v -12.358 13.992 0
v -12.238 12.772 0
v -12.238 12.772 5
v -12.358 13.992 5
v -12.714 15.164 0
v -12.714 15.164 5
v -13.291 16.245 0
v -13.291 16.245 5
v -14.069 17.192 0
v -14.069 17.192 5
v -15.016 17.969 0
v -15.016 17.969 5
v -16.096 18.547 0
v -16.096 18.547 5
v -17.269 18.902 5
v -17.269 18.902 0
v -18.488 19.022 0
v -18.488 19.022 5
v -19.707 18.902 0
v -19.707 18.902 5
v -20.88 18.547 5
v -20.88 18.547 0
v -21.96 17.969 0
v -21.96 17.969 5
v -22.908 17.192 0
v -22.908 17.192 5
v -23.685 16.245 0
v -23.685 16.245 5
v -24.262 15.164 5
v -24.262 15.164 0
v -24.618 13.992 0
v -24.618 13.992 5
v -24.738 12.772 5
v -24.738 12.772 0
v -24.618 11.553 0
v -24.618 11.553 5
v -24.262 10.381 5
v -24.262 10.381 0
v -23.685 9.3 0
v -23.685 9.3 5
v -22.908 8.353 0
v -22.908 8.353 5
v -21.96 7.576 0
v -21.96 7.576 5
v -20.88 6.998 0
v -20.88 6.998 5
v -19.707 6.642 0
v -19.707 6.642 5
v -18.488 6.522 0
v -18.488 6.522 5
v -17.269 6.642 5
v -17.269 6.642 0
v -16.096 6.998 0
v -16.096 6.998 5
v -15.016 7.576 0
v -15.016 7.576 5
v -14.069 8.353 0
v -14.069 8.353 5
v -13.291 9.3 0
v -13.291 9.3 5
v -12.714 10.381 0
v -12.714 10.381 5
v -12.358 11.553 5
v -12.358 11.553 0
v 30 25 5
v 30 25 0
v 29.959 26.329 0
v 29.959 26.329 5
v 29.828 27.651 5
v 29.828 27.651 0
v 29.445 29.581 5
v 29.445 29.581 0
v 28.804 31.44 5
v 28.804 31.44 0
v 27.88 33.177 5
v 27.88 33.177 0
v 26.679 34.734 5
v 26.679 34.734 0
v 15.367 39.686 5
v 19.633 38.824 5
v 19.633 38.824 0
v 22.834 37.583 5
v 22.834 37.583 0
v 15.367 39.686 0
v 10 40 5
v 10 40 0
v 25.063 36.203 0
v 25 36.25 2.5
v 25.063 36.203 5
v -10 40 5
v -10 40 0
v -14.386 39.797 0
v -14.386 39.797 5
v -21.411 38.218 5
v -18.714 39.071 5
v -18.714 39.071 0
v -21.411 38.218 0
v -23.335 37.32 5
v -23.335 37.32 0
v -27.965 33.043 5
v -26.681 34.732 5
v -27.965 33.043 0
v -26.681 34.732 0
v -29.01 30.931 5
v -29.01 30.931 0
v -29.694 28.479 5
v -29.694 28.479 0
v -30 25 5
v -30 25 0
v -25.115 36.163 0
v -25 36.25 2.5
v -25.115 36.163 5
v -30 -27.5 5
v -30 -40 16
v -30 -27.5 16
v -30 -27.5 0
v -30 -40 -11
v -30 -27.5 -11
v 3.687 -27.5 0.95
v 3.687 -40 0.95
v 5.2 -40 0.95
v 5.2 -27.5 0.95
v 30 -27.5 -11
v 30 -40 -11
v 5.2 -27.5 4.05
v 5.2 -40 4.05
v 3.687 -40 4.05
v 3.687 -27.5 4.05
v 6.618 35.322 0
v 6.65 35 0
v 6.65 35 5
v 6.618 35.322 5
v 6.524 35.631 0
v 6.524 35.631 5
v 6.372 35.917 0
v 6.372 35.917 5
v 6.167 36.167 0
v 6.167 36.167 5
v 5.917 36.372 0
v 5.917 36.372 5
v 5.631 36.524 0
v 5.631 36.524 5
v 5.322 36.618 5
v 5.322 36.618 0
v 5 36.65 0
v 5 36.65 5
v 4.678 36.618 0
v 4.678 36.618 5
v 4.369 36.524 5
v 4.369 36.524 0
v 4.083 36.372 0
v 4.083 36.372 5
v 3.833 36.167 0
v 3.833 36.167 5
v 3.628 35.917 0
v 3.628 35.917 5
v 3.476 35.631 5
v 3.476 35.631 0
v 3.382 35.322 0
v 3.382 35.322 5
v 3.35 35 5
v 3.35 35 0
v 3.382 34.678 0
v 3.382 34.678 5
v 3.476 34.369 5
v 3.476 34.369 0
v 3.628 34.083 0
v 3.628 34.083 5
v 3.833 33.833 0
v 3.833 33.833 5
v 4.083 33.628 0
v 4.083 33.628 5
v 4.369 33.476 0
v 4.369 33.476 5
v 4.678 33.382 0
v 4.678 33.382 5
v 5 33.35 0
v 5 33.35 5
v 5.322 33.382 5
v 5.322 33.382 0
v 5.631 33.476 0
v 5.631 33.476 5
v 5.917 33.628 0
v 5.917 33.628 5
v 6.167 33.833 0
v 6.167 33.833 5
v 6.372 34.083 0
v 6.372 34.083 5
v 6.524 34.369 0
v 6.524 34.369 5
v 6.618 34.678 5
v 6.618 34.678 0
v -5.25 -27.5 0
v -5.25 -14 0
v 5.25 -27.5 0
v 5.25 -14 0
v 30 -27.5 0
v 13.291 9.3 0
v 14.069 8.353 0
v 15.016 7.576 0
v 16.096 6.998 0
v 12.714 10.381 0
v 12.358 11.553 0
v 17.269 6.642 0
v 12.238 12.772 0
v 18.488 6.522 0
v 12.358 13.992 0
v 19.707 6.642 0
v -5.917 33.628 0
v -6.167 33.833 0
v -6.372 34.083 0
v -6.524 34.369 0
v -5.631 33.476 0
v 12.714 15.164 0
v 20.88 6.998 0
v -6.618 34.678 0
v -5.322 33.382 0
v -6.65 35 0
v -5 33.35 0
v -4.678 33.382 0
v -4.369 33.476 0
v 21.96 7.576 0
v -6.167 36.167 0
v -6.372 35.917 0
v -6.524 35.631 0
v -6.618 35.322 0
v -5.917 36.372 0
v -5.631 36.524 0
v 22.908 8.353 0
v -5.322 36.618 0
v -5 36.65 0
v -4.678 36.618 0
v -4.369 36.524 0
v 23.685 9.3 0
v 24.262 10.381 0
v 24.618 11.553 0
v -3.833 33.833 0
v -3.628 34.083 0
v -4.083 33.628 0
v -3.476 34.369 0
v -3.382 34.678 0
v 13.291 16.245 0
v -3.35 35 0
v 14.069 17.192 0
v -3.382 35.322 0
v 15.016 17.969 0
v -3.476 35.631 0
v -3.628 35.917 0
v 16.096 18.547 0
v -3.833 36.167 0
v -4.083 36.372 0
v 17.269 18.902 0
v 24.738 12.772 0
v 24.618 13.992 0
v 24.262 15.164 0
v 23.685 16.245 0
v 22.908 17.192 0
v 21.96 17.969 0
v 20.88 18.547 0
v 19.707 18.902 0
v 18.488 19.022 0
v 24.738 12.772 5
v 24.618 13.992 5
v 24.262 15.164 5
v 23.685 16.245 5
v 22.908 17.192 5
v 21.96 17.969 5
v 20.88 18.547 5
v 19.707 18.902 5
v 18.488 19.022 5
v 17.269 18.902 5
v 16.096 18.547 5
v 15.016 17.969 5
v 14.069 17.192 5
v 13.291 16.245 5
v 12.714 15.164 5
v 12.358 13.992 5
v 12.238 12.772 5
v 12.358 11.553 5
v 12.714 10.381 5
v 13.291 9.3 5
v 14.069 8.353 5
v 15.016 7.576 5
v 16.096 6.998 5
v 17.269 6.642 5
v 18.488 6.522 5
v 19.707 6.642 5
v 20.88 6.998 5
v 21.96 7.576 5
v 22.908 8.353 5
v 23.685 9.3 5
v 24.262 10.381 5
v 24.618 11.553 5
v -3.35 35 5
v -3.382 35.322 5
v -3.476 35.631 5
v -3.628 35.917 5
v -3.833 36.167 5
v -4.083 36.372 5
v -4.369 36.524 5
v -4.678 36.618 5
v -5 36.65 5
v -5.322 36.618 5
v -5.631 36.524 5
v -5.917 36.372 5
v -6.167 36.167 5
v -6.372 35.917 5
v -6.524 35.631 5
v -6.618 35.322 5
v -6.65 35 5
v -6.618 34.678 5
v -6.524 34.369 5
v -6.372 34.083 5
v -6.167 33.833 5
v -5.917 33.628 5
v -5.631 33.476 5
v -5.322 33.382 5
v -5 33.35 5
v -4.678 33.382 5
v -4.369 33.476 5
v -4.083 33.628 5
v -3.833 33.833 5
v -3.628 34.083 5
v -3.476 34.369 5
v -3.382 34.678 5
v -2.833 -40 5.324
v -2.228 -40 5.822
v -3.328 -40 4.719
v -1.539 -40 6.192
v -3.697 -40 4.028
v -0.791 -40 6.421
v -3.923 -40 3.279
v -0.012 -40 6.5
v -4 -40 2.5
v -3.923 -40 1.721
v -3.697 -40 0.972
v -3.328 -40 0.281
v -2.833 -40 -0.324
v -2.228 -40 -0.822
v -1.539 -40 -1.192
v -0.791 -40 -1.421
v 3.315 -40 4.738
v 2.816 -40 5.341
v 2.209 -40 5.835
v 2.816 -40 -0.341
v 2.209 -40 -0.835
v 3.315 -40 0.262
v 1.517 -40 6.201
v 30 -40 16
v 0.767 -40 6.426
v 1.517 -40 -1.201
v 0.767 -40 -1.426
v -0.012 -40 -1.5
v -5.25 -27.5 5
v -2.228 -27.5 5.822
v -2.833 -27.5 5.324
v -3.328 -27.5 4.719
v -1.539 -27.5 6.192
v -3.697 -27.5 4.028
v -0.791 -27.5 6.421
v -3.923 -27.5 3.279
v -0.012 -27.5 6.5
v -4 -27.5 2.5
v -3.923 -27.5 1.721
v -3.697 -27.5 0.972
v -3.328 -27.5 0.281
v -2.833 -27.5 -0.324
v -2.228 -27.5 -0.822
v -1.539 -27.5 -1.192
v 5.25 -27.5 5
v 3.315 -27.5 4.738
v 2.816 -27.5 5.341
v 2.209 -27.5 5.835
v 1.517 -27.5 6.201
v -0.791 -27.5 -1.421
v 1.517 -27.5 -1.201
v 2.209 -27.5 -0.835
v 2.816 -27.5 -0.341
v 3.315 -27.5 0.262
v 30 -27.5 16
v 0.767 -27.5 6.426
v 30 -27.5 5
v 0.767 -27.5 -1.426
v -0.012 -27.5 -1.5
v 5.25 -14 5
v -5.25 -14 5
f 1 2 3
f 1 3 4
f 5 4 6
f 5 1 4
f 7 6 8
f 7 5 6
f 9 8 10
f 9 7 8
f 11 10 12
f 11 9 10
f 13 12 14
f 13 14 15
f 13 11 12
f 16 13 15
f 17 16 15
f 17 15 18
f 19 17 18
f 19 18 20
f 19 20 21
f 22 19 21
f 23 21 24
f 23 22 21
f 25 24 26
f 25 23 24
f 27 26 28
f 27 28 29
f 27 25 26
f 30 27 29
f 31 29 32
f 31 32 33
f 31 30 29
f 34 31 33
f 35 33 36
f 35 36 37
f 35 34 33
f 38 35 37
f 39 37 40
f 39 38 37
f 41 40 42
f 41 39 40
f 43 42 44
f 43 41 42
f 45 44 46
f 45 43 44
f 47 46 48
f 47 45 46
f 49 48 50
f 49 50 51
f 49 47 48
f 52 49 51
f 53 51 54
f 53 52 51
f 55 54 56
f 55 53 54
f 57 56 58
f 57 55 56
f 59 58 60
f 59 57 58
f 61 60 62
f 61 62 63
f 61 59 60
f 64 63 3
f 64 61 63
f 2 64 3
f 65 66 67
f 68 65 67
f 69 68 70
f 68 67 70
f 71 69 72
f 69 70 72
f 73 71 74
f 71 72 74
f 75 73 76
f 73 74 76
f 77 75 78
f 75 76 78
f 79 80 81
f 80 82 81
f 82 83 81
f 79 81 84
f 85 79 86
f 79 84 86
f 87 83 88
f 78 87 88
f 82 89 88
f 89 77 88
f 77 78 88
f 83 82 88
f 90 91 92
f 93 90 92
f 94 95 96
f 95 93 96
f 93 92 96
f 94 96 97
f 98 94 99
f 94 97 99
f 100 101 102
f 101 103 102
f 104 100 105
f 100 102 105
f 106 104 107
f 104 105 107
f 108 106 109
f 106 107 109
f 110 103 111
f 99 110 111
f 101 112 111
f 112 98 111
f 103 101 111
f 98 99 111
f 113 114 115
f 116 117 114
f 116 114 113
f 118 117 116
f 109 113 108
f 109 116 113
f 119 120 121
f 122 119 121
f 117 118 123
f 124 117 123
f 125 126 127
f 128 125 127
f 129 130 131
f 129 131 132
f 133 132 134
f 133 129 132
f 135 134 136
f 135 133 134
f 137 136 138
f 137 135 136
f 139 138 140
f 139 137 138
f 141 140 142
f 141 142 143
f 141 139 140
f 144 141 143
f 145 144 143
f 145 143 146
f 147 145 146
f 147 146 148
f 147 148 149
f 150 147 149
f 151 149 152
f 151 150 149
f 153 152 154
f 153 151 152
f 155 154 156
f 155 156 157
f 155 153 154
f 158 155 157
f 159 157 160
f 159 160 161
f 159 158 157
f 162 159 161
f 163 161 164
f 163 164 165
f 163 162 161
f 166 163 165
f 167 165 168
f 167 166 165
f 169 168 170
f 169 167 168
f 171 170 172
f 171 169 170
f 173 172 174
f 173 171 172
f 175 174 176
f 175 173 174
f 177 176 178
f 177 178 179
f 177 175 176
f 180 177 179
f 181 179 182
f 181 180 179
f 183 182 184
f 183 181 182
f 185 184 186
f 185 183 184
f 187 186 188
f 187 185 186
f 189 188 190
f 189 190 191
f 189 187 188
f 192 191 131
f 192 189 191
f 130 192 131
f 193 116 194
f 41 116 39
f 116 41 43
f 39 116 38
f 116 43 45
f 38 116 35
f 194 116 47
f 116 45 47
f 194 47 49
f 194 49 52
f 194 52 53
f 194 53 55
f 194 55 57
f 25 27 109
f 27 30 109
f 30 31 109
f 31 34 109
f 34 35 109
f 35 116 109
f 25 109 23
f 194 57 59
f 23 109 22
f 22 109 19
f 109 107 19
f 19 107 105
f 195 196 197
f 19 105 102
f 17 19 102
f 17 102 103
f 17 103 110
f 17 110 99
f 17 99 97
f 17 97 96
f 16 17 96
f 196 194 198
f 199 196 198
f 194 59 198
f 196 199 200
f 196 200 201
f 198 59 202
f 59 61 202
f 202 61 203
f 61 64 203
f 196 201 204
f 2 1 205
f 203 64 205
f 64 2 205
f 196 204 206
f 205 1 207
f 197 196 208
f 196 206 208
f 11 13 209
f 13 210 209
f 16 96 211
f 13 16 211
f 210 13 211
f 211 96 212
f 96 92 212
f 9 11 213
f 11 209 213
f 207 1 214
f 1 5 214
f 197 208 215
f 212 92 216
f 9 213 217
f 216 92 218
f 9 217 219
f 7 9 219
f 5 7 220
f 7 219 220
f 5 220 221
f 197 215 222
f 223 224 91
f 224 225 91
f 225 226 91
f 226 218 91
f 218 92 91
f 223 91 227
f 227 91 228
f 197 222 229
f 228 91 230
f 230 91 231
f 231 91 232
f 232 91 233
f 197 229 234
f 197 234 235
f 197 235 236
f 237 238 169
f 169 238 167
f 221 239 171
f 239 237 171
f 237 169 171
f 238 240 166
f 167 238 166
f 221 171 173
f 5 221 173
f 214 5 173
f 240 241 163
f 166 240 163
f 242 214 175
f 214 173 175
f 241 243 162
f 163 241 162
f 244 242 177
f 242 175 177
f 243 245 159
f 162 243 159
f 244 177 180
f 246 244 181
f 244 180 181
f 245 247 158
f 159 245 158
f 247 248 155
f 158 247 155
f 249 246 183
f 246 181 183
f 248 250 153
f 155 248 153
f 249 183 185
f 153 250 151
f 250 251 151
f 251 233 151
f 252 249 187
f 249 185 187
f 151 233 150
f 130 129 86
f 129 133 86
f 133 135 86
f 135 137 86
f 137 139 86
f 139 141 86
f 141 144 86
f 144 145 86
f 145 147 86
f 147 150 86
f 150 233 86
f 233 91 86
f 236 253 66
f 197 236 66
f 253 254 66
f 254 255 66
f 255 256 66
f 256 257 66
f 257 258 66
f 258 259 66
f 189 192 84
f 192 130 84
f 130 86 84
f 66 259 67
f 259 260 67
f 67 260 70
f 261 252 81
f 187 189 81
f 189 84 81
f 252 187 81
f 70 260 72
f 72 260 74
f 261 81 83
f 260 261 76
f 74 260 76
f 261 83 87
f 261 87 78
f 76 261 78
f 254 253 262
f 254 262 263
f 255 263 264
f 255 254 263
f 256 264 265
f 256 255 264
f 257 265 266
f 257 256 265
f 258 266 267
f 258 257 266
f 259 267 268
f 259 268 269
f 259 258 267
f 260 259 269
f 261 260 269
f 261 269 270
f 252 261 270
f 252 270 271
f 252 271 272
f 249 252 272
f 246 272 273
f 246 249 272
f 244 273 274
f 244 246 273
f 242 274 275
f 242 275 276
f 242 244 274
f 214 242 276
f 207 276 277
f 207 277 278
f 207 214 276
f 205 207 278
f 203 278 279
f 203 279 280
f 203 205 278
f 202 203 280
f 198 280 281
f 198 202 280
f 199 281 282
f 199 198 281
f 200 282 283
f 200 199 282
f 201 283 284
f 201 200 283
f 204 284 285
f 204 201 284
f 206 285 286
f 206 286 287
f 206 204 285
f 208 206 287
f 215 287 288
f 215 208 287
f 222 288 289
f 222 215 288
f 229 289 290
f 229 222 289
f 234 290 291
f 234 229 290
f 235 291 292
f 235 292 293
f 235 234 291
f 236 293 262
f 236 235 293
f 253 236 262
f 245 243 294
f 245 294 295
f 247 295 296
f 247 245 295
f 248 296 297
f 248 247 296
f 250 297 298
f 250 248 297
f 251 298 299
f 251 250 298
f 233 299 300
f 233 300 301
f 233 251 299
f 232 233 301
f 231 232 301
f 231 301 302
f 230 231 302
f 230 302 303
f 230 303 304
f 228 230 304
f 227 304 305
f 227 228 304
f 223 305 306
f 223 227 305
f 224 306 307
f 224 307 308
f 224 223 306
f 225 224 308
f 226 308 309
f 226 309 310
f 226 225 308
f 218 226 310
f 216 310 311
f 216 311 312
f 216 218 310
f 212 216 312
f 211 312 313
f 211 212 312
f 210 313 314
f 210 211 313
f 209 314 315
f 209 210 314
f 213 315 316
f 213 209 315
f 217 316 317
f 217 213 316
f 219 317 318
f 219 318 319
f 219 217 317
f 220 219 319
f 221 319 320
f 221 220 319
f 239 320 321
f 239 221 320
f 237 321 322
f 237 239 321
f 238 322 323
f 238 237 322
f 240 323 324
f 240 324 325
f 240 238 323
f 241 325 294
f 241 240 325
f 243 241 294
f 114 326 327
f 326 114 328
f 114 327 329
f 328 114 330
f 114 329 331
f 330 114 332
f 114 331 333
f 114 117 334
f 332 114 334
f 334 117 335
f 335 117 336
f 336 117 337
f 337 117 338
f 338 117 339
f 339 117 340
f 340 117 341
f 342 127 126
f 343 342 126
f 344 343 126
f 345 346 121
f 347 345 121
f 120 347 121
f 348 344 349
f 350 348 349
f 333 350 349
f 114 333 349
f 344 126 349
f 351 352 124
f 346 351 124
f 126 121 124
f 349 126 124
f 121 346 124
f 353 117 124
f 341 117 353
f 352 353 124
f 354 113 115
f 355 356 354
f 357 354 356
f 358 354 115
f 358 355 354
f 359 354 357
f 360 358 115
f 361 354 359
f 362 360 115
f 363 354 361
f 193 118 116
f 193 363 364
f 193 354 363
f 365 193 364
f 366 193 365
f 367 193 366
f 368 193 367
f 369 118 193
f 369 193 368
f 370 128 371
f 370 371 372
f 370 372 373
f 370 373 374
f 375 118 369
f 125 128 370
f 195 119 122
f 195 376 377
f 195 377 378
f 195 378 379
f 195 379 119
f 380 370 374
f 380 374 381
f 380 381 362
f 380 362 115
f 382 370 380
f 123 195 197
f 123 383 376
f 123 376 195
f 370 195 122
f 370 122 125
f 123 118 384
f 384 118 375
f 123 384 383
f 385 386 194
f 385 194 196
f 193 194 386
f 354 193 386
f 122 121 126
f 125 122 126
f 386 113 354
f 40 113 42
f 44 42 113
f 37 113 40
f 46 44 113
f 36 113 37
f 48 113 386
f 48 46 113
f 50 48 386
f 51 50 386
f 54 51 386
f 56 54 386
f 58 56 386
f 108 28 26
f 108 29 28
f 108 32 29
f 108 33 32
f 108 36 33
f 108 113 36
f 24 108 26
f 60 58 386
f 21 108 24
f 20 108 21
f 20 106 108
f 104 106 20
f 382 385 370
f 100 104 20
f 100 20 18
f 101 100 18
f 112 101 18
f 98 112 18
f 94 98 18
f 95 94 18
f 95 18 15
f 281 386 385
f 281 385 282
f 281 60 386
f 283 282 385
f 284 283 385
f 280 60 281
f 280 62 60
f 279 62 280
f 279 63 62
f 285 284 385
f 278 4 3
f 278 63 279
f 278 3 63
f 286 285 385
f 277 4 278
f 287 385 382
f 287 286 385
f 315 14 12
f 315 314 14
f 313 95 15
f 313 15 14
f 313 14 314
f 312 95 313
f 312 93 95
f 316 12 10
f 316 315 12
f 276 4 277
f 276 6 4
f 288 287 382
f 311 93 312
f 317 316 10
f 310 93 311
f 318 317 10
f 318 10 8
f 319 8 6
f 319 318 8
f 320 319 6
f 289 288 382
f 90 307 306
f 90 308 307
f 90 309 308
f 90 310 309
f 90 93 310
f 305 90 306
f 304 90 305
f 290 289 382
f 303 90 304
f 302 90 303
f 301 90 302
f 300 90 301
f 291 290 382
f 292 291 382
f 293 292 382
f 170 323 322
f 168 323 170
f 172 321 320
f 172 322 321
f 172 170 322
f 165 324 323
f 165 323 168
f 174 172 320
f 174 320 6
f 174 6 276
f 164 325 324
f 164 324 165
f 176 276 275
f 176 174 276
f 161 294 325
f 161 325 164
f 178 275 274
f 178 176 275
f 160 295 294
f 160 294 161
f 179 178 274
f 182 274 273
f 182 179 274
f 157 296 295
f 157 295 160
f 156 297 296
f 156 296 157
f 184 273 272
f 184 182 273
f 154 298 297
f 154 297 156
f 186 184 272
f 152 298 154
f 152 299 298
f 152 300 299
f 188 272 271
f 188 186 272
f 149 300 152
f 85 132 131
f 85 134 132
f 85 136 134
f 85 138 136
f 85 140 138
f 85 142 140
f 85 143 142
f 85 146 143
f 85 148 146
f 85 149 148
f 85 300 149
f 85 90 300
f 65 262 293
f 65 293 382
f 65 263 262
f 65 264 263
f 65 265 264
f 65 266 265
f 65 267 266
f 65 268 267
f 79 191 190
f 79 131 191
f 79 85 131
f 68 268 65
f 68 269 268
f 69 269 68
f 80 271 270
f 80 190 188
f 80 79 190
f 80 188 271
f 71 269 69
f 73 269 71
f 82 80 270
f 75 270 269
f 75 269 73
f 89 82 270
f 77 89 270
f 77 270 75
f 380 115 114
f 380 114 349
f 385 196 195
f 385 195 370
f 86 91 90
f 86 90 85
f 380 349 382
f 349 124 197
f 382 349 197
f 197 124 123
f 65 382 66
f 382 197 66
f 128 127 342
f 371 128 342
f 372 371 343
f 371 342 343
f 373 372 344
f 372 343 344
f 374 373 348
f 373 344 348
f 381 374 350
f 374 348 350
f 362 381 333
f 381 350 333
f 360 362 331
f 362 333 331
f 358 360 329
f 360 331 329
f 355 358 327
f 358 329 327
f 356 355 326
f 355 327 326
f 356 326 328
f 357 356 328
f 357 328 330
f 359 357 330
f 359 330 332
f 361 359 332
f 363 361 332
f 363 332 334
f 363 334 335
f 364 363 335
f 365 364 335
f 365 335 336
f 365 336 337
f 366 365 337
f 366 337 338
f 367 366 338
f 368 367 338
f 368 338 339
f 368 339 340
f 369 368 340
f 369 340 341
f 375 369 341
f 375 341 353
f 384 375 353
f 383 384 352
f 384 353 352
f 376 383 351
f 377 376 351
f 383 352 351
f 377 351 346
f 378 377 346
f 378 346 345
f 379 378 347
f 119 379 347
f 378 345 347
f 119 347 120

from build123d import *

# Parameters (mm, degrees)
SKIZZE1_W                            = 60
SKIZZE1_H                            = 80
SKIZZE1_R                            = 1.65
SKIZZE1_R_2                          = 6.25
AUFSATZ_LINEAR_AUSTRAGEN1_DEPTH      = 5
VERRUNDUNG1_SIZE                     = 15
VERRUNDUNG1_SIZE_2                   = 20
AUFSATZ_LINEAR_AUSTRAGEN2_DEPTH      = 11
AUFSATZ_LINEAR_AUSTRAGEN2_DEPTH_BACK = 16
SKIZZE2_W                            = 60
SKIZZE2_H                            = 12.5
SCHNITT_LINEAR_AUSTRAGEN1_DEPTH      = 13
SCHNITT_LINEAR_AUSTRAGEN2_DEPTH      = 0.5
SCHNITT_LINEAR_AUSTRAGEN2_DEPTH_BACK = 13
SKIZZE4_W                            = 10.5
SKIZZE4_H                            = 10.5


with BuildPart() as part:
    # Skizze1 → Aufsatz-Linear austragen1 (new body)
    with BuildSketch(Plane.XY):
        Rectangle(SKIZZE1_W, SKIZZE1_H)
        with Locations((-5, 35)):
            Circle(SKIZZE1_R, mode=Mode.SUBTRACT)
        with Locations((5, 35)):
            Circle(SKIZZE1_R, mode=Mode.SUBTRACT)
        with Locations((-18.488104712, 12.772291363)):
            Circle(SKIZZE1_R_2, mode=Mode.SUBTRACT)
        with Locations((18.488104712, 12.772291363)):
            Circle(SKIZZE1_R_2, mode=Mode.SUBTRACT)
    extrude(amount=AUFSATZ_LINEAR_AUSTRAGEN1_DEPTH)

    # Verrundung1
    # a fillet whose section is not a circle: 20, 15 mm, written as the material it takes off along each edge
    with BuildSketch(Plane(origin=(30, 40, -50), x_dir=(0, -1, 0), z_dir=(0, 0, 1))) as verrundung1_piece_1:
        with BuildLine():
            Bezier((VERRUNDUNG1_SIZE, 0), (0, 0), (0, -VERRUNDUNG1_SIZE_2), weights=[1, 1, 1])
            Line((0, -VERRUNDUNG1_SIZE_2), (0, 0))
            Line((0, 0), (VERRUNDUNG1_SIZE, 0))
        make_face()
    extrude(amount=105, mode=Mode.SUBTRACT)
    with BuildSketch(Plane(origin=(-30, 40, -50), x_dir=(1, 0, 0), z_dir=(0, 0, 1))) as verrundung1_piece_2:
        with BuildLine():
            Bezier((VERRUNDUNG1_SIZE_2, 0), (0, 0), (0, -VERRUNDUNG1_SIZE), weights=[1, 1, 1])
            Line((0, -VERRUNDUNG1_SIZE), (0, 0))
            Line((0, 0), (VERRUNDUNG1_SIZE_2, 0))
        make_face()
    extrude(amount=105, mode=Mode.SUBTRACT)

    # Skizze2 → Aufsatz-Linear austragen2 (add, two sides: drawn at the far end of the back side and taken through both)
    with BuildSketch(Plane.XY.offset(5).offset(-AUFSATZ_LINEAR_AUSTRAGEN2_DEPTH_BACK)):
        with Locations((0, -33.75)):
            Rectangle(SKIZZE2_W, SKIZZE2_H)
    extrude(amount=AUFSATZ_LINEAR_AUSTRAGEN2_DEPTH + AUFSATZ_LINEAR_AUSTRAGEN2_DEPTH_BACK)

    # Skizze3 → Schnitt-Linear austragen1 (cut)
    with BuildSketch(Plane.XZ.offset(40)):
        with BuildLine():
            Line((2.8, 4.05), (2.8, 0.95))
            Line((2.8, 0.95), (3.687478813, 0.95))
            ThreePointArc((3.687478813, 0.95), (3.921091382, 1.709403786), (4, 2.5))
            ThreePointArc((4, 2.5), (3.921091382, 3.290596214), (3.687478813, 4.05))
            Line((3.687478813, 4.05), (2.8, 4.05))
        make_face()
        with BuildLine():
            Line((3.687478813, 0.95), (2.8, 0.95))
            Line((2.8, 0.95), (2.8, 4.05))
            Line((2.8, 4.05), (3.687478813, 4.05))
            ThreePointArc((3.687478813, 4.05), (-4, 2.5), (3.687478813, 0.95))
        make_face()
        with BuildLine():
            ThreePointArc((4, 2.5), (3.921091382, 1.709403786), (3.687478813, 0.95))
            Line((3.687478813, 0.95), (5.2, 0.95))
            Line((5.2, 0.95), (5.2, 4.05))
            Line((5.2, 4.05), (3.687478813, 4.05))
            ThreePointArc((3.687478813, 4.05), (3.921091382, 3.290596214), (4, 2.5))
        make_face()
    extrude(amount=-SCHNITT_LINEAR_AUSTRAGEN1_DEPTH, mode=Mode.SUBTRACT)

    # Skizze4 → Schnitt-Linear austragen2 (cut, two sides: drawn at the far end of the back side and taken through both)
    with BuildSketch(Plane.XZ.offset(27).offset(-SCHNITT_LINEAR_AUSTRAGEN2_DEPTH_BACK)):
        with Locations((0, 2.5)):
            Rectangle(SKIZZE4_W, SKIZZE4_H)
    extrude(amount=SCHNITT_LINEAR_AUSTRAGEN2_DEPTH + SCHNITT_LINEAR_AUSTRAGEN2_DEPTH_BACK, mode=Mode.SUBTRACT)


solid = part.part
